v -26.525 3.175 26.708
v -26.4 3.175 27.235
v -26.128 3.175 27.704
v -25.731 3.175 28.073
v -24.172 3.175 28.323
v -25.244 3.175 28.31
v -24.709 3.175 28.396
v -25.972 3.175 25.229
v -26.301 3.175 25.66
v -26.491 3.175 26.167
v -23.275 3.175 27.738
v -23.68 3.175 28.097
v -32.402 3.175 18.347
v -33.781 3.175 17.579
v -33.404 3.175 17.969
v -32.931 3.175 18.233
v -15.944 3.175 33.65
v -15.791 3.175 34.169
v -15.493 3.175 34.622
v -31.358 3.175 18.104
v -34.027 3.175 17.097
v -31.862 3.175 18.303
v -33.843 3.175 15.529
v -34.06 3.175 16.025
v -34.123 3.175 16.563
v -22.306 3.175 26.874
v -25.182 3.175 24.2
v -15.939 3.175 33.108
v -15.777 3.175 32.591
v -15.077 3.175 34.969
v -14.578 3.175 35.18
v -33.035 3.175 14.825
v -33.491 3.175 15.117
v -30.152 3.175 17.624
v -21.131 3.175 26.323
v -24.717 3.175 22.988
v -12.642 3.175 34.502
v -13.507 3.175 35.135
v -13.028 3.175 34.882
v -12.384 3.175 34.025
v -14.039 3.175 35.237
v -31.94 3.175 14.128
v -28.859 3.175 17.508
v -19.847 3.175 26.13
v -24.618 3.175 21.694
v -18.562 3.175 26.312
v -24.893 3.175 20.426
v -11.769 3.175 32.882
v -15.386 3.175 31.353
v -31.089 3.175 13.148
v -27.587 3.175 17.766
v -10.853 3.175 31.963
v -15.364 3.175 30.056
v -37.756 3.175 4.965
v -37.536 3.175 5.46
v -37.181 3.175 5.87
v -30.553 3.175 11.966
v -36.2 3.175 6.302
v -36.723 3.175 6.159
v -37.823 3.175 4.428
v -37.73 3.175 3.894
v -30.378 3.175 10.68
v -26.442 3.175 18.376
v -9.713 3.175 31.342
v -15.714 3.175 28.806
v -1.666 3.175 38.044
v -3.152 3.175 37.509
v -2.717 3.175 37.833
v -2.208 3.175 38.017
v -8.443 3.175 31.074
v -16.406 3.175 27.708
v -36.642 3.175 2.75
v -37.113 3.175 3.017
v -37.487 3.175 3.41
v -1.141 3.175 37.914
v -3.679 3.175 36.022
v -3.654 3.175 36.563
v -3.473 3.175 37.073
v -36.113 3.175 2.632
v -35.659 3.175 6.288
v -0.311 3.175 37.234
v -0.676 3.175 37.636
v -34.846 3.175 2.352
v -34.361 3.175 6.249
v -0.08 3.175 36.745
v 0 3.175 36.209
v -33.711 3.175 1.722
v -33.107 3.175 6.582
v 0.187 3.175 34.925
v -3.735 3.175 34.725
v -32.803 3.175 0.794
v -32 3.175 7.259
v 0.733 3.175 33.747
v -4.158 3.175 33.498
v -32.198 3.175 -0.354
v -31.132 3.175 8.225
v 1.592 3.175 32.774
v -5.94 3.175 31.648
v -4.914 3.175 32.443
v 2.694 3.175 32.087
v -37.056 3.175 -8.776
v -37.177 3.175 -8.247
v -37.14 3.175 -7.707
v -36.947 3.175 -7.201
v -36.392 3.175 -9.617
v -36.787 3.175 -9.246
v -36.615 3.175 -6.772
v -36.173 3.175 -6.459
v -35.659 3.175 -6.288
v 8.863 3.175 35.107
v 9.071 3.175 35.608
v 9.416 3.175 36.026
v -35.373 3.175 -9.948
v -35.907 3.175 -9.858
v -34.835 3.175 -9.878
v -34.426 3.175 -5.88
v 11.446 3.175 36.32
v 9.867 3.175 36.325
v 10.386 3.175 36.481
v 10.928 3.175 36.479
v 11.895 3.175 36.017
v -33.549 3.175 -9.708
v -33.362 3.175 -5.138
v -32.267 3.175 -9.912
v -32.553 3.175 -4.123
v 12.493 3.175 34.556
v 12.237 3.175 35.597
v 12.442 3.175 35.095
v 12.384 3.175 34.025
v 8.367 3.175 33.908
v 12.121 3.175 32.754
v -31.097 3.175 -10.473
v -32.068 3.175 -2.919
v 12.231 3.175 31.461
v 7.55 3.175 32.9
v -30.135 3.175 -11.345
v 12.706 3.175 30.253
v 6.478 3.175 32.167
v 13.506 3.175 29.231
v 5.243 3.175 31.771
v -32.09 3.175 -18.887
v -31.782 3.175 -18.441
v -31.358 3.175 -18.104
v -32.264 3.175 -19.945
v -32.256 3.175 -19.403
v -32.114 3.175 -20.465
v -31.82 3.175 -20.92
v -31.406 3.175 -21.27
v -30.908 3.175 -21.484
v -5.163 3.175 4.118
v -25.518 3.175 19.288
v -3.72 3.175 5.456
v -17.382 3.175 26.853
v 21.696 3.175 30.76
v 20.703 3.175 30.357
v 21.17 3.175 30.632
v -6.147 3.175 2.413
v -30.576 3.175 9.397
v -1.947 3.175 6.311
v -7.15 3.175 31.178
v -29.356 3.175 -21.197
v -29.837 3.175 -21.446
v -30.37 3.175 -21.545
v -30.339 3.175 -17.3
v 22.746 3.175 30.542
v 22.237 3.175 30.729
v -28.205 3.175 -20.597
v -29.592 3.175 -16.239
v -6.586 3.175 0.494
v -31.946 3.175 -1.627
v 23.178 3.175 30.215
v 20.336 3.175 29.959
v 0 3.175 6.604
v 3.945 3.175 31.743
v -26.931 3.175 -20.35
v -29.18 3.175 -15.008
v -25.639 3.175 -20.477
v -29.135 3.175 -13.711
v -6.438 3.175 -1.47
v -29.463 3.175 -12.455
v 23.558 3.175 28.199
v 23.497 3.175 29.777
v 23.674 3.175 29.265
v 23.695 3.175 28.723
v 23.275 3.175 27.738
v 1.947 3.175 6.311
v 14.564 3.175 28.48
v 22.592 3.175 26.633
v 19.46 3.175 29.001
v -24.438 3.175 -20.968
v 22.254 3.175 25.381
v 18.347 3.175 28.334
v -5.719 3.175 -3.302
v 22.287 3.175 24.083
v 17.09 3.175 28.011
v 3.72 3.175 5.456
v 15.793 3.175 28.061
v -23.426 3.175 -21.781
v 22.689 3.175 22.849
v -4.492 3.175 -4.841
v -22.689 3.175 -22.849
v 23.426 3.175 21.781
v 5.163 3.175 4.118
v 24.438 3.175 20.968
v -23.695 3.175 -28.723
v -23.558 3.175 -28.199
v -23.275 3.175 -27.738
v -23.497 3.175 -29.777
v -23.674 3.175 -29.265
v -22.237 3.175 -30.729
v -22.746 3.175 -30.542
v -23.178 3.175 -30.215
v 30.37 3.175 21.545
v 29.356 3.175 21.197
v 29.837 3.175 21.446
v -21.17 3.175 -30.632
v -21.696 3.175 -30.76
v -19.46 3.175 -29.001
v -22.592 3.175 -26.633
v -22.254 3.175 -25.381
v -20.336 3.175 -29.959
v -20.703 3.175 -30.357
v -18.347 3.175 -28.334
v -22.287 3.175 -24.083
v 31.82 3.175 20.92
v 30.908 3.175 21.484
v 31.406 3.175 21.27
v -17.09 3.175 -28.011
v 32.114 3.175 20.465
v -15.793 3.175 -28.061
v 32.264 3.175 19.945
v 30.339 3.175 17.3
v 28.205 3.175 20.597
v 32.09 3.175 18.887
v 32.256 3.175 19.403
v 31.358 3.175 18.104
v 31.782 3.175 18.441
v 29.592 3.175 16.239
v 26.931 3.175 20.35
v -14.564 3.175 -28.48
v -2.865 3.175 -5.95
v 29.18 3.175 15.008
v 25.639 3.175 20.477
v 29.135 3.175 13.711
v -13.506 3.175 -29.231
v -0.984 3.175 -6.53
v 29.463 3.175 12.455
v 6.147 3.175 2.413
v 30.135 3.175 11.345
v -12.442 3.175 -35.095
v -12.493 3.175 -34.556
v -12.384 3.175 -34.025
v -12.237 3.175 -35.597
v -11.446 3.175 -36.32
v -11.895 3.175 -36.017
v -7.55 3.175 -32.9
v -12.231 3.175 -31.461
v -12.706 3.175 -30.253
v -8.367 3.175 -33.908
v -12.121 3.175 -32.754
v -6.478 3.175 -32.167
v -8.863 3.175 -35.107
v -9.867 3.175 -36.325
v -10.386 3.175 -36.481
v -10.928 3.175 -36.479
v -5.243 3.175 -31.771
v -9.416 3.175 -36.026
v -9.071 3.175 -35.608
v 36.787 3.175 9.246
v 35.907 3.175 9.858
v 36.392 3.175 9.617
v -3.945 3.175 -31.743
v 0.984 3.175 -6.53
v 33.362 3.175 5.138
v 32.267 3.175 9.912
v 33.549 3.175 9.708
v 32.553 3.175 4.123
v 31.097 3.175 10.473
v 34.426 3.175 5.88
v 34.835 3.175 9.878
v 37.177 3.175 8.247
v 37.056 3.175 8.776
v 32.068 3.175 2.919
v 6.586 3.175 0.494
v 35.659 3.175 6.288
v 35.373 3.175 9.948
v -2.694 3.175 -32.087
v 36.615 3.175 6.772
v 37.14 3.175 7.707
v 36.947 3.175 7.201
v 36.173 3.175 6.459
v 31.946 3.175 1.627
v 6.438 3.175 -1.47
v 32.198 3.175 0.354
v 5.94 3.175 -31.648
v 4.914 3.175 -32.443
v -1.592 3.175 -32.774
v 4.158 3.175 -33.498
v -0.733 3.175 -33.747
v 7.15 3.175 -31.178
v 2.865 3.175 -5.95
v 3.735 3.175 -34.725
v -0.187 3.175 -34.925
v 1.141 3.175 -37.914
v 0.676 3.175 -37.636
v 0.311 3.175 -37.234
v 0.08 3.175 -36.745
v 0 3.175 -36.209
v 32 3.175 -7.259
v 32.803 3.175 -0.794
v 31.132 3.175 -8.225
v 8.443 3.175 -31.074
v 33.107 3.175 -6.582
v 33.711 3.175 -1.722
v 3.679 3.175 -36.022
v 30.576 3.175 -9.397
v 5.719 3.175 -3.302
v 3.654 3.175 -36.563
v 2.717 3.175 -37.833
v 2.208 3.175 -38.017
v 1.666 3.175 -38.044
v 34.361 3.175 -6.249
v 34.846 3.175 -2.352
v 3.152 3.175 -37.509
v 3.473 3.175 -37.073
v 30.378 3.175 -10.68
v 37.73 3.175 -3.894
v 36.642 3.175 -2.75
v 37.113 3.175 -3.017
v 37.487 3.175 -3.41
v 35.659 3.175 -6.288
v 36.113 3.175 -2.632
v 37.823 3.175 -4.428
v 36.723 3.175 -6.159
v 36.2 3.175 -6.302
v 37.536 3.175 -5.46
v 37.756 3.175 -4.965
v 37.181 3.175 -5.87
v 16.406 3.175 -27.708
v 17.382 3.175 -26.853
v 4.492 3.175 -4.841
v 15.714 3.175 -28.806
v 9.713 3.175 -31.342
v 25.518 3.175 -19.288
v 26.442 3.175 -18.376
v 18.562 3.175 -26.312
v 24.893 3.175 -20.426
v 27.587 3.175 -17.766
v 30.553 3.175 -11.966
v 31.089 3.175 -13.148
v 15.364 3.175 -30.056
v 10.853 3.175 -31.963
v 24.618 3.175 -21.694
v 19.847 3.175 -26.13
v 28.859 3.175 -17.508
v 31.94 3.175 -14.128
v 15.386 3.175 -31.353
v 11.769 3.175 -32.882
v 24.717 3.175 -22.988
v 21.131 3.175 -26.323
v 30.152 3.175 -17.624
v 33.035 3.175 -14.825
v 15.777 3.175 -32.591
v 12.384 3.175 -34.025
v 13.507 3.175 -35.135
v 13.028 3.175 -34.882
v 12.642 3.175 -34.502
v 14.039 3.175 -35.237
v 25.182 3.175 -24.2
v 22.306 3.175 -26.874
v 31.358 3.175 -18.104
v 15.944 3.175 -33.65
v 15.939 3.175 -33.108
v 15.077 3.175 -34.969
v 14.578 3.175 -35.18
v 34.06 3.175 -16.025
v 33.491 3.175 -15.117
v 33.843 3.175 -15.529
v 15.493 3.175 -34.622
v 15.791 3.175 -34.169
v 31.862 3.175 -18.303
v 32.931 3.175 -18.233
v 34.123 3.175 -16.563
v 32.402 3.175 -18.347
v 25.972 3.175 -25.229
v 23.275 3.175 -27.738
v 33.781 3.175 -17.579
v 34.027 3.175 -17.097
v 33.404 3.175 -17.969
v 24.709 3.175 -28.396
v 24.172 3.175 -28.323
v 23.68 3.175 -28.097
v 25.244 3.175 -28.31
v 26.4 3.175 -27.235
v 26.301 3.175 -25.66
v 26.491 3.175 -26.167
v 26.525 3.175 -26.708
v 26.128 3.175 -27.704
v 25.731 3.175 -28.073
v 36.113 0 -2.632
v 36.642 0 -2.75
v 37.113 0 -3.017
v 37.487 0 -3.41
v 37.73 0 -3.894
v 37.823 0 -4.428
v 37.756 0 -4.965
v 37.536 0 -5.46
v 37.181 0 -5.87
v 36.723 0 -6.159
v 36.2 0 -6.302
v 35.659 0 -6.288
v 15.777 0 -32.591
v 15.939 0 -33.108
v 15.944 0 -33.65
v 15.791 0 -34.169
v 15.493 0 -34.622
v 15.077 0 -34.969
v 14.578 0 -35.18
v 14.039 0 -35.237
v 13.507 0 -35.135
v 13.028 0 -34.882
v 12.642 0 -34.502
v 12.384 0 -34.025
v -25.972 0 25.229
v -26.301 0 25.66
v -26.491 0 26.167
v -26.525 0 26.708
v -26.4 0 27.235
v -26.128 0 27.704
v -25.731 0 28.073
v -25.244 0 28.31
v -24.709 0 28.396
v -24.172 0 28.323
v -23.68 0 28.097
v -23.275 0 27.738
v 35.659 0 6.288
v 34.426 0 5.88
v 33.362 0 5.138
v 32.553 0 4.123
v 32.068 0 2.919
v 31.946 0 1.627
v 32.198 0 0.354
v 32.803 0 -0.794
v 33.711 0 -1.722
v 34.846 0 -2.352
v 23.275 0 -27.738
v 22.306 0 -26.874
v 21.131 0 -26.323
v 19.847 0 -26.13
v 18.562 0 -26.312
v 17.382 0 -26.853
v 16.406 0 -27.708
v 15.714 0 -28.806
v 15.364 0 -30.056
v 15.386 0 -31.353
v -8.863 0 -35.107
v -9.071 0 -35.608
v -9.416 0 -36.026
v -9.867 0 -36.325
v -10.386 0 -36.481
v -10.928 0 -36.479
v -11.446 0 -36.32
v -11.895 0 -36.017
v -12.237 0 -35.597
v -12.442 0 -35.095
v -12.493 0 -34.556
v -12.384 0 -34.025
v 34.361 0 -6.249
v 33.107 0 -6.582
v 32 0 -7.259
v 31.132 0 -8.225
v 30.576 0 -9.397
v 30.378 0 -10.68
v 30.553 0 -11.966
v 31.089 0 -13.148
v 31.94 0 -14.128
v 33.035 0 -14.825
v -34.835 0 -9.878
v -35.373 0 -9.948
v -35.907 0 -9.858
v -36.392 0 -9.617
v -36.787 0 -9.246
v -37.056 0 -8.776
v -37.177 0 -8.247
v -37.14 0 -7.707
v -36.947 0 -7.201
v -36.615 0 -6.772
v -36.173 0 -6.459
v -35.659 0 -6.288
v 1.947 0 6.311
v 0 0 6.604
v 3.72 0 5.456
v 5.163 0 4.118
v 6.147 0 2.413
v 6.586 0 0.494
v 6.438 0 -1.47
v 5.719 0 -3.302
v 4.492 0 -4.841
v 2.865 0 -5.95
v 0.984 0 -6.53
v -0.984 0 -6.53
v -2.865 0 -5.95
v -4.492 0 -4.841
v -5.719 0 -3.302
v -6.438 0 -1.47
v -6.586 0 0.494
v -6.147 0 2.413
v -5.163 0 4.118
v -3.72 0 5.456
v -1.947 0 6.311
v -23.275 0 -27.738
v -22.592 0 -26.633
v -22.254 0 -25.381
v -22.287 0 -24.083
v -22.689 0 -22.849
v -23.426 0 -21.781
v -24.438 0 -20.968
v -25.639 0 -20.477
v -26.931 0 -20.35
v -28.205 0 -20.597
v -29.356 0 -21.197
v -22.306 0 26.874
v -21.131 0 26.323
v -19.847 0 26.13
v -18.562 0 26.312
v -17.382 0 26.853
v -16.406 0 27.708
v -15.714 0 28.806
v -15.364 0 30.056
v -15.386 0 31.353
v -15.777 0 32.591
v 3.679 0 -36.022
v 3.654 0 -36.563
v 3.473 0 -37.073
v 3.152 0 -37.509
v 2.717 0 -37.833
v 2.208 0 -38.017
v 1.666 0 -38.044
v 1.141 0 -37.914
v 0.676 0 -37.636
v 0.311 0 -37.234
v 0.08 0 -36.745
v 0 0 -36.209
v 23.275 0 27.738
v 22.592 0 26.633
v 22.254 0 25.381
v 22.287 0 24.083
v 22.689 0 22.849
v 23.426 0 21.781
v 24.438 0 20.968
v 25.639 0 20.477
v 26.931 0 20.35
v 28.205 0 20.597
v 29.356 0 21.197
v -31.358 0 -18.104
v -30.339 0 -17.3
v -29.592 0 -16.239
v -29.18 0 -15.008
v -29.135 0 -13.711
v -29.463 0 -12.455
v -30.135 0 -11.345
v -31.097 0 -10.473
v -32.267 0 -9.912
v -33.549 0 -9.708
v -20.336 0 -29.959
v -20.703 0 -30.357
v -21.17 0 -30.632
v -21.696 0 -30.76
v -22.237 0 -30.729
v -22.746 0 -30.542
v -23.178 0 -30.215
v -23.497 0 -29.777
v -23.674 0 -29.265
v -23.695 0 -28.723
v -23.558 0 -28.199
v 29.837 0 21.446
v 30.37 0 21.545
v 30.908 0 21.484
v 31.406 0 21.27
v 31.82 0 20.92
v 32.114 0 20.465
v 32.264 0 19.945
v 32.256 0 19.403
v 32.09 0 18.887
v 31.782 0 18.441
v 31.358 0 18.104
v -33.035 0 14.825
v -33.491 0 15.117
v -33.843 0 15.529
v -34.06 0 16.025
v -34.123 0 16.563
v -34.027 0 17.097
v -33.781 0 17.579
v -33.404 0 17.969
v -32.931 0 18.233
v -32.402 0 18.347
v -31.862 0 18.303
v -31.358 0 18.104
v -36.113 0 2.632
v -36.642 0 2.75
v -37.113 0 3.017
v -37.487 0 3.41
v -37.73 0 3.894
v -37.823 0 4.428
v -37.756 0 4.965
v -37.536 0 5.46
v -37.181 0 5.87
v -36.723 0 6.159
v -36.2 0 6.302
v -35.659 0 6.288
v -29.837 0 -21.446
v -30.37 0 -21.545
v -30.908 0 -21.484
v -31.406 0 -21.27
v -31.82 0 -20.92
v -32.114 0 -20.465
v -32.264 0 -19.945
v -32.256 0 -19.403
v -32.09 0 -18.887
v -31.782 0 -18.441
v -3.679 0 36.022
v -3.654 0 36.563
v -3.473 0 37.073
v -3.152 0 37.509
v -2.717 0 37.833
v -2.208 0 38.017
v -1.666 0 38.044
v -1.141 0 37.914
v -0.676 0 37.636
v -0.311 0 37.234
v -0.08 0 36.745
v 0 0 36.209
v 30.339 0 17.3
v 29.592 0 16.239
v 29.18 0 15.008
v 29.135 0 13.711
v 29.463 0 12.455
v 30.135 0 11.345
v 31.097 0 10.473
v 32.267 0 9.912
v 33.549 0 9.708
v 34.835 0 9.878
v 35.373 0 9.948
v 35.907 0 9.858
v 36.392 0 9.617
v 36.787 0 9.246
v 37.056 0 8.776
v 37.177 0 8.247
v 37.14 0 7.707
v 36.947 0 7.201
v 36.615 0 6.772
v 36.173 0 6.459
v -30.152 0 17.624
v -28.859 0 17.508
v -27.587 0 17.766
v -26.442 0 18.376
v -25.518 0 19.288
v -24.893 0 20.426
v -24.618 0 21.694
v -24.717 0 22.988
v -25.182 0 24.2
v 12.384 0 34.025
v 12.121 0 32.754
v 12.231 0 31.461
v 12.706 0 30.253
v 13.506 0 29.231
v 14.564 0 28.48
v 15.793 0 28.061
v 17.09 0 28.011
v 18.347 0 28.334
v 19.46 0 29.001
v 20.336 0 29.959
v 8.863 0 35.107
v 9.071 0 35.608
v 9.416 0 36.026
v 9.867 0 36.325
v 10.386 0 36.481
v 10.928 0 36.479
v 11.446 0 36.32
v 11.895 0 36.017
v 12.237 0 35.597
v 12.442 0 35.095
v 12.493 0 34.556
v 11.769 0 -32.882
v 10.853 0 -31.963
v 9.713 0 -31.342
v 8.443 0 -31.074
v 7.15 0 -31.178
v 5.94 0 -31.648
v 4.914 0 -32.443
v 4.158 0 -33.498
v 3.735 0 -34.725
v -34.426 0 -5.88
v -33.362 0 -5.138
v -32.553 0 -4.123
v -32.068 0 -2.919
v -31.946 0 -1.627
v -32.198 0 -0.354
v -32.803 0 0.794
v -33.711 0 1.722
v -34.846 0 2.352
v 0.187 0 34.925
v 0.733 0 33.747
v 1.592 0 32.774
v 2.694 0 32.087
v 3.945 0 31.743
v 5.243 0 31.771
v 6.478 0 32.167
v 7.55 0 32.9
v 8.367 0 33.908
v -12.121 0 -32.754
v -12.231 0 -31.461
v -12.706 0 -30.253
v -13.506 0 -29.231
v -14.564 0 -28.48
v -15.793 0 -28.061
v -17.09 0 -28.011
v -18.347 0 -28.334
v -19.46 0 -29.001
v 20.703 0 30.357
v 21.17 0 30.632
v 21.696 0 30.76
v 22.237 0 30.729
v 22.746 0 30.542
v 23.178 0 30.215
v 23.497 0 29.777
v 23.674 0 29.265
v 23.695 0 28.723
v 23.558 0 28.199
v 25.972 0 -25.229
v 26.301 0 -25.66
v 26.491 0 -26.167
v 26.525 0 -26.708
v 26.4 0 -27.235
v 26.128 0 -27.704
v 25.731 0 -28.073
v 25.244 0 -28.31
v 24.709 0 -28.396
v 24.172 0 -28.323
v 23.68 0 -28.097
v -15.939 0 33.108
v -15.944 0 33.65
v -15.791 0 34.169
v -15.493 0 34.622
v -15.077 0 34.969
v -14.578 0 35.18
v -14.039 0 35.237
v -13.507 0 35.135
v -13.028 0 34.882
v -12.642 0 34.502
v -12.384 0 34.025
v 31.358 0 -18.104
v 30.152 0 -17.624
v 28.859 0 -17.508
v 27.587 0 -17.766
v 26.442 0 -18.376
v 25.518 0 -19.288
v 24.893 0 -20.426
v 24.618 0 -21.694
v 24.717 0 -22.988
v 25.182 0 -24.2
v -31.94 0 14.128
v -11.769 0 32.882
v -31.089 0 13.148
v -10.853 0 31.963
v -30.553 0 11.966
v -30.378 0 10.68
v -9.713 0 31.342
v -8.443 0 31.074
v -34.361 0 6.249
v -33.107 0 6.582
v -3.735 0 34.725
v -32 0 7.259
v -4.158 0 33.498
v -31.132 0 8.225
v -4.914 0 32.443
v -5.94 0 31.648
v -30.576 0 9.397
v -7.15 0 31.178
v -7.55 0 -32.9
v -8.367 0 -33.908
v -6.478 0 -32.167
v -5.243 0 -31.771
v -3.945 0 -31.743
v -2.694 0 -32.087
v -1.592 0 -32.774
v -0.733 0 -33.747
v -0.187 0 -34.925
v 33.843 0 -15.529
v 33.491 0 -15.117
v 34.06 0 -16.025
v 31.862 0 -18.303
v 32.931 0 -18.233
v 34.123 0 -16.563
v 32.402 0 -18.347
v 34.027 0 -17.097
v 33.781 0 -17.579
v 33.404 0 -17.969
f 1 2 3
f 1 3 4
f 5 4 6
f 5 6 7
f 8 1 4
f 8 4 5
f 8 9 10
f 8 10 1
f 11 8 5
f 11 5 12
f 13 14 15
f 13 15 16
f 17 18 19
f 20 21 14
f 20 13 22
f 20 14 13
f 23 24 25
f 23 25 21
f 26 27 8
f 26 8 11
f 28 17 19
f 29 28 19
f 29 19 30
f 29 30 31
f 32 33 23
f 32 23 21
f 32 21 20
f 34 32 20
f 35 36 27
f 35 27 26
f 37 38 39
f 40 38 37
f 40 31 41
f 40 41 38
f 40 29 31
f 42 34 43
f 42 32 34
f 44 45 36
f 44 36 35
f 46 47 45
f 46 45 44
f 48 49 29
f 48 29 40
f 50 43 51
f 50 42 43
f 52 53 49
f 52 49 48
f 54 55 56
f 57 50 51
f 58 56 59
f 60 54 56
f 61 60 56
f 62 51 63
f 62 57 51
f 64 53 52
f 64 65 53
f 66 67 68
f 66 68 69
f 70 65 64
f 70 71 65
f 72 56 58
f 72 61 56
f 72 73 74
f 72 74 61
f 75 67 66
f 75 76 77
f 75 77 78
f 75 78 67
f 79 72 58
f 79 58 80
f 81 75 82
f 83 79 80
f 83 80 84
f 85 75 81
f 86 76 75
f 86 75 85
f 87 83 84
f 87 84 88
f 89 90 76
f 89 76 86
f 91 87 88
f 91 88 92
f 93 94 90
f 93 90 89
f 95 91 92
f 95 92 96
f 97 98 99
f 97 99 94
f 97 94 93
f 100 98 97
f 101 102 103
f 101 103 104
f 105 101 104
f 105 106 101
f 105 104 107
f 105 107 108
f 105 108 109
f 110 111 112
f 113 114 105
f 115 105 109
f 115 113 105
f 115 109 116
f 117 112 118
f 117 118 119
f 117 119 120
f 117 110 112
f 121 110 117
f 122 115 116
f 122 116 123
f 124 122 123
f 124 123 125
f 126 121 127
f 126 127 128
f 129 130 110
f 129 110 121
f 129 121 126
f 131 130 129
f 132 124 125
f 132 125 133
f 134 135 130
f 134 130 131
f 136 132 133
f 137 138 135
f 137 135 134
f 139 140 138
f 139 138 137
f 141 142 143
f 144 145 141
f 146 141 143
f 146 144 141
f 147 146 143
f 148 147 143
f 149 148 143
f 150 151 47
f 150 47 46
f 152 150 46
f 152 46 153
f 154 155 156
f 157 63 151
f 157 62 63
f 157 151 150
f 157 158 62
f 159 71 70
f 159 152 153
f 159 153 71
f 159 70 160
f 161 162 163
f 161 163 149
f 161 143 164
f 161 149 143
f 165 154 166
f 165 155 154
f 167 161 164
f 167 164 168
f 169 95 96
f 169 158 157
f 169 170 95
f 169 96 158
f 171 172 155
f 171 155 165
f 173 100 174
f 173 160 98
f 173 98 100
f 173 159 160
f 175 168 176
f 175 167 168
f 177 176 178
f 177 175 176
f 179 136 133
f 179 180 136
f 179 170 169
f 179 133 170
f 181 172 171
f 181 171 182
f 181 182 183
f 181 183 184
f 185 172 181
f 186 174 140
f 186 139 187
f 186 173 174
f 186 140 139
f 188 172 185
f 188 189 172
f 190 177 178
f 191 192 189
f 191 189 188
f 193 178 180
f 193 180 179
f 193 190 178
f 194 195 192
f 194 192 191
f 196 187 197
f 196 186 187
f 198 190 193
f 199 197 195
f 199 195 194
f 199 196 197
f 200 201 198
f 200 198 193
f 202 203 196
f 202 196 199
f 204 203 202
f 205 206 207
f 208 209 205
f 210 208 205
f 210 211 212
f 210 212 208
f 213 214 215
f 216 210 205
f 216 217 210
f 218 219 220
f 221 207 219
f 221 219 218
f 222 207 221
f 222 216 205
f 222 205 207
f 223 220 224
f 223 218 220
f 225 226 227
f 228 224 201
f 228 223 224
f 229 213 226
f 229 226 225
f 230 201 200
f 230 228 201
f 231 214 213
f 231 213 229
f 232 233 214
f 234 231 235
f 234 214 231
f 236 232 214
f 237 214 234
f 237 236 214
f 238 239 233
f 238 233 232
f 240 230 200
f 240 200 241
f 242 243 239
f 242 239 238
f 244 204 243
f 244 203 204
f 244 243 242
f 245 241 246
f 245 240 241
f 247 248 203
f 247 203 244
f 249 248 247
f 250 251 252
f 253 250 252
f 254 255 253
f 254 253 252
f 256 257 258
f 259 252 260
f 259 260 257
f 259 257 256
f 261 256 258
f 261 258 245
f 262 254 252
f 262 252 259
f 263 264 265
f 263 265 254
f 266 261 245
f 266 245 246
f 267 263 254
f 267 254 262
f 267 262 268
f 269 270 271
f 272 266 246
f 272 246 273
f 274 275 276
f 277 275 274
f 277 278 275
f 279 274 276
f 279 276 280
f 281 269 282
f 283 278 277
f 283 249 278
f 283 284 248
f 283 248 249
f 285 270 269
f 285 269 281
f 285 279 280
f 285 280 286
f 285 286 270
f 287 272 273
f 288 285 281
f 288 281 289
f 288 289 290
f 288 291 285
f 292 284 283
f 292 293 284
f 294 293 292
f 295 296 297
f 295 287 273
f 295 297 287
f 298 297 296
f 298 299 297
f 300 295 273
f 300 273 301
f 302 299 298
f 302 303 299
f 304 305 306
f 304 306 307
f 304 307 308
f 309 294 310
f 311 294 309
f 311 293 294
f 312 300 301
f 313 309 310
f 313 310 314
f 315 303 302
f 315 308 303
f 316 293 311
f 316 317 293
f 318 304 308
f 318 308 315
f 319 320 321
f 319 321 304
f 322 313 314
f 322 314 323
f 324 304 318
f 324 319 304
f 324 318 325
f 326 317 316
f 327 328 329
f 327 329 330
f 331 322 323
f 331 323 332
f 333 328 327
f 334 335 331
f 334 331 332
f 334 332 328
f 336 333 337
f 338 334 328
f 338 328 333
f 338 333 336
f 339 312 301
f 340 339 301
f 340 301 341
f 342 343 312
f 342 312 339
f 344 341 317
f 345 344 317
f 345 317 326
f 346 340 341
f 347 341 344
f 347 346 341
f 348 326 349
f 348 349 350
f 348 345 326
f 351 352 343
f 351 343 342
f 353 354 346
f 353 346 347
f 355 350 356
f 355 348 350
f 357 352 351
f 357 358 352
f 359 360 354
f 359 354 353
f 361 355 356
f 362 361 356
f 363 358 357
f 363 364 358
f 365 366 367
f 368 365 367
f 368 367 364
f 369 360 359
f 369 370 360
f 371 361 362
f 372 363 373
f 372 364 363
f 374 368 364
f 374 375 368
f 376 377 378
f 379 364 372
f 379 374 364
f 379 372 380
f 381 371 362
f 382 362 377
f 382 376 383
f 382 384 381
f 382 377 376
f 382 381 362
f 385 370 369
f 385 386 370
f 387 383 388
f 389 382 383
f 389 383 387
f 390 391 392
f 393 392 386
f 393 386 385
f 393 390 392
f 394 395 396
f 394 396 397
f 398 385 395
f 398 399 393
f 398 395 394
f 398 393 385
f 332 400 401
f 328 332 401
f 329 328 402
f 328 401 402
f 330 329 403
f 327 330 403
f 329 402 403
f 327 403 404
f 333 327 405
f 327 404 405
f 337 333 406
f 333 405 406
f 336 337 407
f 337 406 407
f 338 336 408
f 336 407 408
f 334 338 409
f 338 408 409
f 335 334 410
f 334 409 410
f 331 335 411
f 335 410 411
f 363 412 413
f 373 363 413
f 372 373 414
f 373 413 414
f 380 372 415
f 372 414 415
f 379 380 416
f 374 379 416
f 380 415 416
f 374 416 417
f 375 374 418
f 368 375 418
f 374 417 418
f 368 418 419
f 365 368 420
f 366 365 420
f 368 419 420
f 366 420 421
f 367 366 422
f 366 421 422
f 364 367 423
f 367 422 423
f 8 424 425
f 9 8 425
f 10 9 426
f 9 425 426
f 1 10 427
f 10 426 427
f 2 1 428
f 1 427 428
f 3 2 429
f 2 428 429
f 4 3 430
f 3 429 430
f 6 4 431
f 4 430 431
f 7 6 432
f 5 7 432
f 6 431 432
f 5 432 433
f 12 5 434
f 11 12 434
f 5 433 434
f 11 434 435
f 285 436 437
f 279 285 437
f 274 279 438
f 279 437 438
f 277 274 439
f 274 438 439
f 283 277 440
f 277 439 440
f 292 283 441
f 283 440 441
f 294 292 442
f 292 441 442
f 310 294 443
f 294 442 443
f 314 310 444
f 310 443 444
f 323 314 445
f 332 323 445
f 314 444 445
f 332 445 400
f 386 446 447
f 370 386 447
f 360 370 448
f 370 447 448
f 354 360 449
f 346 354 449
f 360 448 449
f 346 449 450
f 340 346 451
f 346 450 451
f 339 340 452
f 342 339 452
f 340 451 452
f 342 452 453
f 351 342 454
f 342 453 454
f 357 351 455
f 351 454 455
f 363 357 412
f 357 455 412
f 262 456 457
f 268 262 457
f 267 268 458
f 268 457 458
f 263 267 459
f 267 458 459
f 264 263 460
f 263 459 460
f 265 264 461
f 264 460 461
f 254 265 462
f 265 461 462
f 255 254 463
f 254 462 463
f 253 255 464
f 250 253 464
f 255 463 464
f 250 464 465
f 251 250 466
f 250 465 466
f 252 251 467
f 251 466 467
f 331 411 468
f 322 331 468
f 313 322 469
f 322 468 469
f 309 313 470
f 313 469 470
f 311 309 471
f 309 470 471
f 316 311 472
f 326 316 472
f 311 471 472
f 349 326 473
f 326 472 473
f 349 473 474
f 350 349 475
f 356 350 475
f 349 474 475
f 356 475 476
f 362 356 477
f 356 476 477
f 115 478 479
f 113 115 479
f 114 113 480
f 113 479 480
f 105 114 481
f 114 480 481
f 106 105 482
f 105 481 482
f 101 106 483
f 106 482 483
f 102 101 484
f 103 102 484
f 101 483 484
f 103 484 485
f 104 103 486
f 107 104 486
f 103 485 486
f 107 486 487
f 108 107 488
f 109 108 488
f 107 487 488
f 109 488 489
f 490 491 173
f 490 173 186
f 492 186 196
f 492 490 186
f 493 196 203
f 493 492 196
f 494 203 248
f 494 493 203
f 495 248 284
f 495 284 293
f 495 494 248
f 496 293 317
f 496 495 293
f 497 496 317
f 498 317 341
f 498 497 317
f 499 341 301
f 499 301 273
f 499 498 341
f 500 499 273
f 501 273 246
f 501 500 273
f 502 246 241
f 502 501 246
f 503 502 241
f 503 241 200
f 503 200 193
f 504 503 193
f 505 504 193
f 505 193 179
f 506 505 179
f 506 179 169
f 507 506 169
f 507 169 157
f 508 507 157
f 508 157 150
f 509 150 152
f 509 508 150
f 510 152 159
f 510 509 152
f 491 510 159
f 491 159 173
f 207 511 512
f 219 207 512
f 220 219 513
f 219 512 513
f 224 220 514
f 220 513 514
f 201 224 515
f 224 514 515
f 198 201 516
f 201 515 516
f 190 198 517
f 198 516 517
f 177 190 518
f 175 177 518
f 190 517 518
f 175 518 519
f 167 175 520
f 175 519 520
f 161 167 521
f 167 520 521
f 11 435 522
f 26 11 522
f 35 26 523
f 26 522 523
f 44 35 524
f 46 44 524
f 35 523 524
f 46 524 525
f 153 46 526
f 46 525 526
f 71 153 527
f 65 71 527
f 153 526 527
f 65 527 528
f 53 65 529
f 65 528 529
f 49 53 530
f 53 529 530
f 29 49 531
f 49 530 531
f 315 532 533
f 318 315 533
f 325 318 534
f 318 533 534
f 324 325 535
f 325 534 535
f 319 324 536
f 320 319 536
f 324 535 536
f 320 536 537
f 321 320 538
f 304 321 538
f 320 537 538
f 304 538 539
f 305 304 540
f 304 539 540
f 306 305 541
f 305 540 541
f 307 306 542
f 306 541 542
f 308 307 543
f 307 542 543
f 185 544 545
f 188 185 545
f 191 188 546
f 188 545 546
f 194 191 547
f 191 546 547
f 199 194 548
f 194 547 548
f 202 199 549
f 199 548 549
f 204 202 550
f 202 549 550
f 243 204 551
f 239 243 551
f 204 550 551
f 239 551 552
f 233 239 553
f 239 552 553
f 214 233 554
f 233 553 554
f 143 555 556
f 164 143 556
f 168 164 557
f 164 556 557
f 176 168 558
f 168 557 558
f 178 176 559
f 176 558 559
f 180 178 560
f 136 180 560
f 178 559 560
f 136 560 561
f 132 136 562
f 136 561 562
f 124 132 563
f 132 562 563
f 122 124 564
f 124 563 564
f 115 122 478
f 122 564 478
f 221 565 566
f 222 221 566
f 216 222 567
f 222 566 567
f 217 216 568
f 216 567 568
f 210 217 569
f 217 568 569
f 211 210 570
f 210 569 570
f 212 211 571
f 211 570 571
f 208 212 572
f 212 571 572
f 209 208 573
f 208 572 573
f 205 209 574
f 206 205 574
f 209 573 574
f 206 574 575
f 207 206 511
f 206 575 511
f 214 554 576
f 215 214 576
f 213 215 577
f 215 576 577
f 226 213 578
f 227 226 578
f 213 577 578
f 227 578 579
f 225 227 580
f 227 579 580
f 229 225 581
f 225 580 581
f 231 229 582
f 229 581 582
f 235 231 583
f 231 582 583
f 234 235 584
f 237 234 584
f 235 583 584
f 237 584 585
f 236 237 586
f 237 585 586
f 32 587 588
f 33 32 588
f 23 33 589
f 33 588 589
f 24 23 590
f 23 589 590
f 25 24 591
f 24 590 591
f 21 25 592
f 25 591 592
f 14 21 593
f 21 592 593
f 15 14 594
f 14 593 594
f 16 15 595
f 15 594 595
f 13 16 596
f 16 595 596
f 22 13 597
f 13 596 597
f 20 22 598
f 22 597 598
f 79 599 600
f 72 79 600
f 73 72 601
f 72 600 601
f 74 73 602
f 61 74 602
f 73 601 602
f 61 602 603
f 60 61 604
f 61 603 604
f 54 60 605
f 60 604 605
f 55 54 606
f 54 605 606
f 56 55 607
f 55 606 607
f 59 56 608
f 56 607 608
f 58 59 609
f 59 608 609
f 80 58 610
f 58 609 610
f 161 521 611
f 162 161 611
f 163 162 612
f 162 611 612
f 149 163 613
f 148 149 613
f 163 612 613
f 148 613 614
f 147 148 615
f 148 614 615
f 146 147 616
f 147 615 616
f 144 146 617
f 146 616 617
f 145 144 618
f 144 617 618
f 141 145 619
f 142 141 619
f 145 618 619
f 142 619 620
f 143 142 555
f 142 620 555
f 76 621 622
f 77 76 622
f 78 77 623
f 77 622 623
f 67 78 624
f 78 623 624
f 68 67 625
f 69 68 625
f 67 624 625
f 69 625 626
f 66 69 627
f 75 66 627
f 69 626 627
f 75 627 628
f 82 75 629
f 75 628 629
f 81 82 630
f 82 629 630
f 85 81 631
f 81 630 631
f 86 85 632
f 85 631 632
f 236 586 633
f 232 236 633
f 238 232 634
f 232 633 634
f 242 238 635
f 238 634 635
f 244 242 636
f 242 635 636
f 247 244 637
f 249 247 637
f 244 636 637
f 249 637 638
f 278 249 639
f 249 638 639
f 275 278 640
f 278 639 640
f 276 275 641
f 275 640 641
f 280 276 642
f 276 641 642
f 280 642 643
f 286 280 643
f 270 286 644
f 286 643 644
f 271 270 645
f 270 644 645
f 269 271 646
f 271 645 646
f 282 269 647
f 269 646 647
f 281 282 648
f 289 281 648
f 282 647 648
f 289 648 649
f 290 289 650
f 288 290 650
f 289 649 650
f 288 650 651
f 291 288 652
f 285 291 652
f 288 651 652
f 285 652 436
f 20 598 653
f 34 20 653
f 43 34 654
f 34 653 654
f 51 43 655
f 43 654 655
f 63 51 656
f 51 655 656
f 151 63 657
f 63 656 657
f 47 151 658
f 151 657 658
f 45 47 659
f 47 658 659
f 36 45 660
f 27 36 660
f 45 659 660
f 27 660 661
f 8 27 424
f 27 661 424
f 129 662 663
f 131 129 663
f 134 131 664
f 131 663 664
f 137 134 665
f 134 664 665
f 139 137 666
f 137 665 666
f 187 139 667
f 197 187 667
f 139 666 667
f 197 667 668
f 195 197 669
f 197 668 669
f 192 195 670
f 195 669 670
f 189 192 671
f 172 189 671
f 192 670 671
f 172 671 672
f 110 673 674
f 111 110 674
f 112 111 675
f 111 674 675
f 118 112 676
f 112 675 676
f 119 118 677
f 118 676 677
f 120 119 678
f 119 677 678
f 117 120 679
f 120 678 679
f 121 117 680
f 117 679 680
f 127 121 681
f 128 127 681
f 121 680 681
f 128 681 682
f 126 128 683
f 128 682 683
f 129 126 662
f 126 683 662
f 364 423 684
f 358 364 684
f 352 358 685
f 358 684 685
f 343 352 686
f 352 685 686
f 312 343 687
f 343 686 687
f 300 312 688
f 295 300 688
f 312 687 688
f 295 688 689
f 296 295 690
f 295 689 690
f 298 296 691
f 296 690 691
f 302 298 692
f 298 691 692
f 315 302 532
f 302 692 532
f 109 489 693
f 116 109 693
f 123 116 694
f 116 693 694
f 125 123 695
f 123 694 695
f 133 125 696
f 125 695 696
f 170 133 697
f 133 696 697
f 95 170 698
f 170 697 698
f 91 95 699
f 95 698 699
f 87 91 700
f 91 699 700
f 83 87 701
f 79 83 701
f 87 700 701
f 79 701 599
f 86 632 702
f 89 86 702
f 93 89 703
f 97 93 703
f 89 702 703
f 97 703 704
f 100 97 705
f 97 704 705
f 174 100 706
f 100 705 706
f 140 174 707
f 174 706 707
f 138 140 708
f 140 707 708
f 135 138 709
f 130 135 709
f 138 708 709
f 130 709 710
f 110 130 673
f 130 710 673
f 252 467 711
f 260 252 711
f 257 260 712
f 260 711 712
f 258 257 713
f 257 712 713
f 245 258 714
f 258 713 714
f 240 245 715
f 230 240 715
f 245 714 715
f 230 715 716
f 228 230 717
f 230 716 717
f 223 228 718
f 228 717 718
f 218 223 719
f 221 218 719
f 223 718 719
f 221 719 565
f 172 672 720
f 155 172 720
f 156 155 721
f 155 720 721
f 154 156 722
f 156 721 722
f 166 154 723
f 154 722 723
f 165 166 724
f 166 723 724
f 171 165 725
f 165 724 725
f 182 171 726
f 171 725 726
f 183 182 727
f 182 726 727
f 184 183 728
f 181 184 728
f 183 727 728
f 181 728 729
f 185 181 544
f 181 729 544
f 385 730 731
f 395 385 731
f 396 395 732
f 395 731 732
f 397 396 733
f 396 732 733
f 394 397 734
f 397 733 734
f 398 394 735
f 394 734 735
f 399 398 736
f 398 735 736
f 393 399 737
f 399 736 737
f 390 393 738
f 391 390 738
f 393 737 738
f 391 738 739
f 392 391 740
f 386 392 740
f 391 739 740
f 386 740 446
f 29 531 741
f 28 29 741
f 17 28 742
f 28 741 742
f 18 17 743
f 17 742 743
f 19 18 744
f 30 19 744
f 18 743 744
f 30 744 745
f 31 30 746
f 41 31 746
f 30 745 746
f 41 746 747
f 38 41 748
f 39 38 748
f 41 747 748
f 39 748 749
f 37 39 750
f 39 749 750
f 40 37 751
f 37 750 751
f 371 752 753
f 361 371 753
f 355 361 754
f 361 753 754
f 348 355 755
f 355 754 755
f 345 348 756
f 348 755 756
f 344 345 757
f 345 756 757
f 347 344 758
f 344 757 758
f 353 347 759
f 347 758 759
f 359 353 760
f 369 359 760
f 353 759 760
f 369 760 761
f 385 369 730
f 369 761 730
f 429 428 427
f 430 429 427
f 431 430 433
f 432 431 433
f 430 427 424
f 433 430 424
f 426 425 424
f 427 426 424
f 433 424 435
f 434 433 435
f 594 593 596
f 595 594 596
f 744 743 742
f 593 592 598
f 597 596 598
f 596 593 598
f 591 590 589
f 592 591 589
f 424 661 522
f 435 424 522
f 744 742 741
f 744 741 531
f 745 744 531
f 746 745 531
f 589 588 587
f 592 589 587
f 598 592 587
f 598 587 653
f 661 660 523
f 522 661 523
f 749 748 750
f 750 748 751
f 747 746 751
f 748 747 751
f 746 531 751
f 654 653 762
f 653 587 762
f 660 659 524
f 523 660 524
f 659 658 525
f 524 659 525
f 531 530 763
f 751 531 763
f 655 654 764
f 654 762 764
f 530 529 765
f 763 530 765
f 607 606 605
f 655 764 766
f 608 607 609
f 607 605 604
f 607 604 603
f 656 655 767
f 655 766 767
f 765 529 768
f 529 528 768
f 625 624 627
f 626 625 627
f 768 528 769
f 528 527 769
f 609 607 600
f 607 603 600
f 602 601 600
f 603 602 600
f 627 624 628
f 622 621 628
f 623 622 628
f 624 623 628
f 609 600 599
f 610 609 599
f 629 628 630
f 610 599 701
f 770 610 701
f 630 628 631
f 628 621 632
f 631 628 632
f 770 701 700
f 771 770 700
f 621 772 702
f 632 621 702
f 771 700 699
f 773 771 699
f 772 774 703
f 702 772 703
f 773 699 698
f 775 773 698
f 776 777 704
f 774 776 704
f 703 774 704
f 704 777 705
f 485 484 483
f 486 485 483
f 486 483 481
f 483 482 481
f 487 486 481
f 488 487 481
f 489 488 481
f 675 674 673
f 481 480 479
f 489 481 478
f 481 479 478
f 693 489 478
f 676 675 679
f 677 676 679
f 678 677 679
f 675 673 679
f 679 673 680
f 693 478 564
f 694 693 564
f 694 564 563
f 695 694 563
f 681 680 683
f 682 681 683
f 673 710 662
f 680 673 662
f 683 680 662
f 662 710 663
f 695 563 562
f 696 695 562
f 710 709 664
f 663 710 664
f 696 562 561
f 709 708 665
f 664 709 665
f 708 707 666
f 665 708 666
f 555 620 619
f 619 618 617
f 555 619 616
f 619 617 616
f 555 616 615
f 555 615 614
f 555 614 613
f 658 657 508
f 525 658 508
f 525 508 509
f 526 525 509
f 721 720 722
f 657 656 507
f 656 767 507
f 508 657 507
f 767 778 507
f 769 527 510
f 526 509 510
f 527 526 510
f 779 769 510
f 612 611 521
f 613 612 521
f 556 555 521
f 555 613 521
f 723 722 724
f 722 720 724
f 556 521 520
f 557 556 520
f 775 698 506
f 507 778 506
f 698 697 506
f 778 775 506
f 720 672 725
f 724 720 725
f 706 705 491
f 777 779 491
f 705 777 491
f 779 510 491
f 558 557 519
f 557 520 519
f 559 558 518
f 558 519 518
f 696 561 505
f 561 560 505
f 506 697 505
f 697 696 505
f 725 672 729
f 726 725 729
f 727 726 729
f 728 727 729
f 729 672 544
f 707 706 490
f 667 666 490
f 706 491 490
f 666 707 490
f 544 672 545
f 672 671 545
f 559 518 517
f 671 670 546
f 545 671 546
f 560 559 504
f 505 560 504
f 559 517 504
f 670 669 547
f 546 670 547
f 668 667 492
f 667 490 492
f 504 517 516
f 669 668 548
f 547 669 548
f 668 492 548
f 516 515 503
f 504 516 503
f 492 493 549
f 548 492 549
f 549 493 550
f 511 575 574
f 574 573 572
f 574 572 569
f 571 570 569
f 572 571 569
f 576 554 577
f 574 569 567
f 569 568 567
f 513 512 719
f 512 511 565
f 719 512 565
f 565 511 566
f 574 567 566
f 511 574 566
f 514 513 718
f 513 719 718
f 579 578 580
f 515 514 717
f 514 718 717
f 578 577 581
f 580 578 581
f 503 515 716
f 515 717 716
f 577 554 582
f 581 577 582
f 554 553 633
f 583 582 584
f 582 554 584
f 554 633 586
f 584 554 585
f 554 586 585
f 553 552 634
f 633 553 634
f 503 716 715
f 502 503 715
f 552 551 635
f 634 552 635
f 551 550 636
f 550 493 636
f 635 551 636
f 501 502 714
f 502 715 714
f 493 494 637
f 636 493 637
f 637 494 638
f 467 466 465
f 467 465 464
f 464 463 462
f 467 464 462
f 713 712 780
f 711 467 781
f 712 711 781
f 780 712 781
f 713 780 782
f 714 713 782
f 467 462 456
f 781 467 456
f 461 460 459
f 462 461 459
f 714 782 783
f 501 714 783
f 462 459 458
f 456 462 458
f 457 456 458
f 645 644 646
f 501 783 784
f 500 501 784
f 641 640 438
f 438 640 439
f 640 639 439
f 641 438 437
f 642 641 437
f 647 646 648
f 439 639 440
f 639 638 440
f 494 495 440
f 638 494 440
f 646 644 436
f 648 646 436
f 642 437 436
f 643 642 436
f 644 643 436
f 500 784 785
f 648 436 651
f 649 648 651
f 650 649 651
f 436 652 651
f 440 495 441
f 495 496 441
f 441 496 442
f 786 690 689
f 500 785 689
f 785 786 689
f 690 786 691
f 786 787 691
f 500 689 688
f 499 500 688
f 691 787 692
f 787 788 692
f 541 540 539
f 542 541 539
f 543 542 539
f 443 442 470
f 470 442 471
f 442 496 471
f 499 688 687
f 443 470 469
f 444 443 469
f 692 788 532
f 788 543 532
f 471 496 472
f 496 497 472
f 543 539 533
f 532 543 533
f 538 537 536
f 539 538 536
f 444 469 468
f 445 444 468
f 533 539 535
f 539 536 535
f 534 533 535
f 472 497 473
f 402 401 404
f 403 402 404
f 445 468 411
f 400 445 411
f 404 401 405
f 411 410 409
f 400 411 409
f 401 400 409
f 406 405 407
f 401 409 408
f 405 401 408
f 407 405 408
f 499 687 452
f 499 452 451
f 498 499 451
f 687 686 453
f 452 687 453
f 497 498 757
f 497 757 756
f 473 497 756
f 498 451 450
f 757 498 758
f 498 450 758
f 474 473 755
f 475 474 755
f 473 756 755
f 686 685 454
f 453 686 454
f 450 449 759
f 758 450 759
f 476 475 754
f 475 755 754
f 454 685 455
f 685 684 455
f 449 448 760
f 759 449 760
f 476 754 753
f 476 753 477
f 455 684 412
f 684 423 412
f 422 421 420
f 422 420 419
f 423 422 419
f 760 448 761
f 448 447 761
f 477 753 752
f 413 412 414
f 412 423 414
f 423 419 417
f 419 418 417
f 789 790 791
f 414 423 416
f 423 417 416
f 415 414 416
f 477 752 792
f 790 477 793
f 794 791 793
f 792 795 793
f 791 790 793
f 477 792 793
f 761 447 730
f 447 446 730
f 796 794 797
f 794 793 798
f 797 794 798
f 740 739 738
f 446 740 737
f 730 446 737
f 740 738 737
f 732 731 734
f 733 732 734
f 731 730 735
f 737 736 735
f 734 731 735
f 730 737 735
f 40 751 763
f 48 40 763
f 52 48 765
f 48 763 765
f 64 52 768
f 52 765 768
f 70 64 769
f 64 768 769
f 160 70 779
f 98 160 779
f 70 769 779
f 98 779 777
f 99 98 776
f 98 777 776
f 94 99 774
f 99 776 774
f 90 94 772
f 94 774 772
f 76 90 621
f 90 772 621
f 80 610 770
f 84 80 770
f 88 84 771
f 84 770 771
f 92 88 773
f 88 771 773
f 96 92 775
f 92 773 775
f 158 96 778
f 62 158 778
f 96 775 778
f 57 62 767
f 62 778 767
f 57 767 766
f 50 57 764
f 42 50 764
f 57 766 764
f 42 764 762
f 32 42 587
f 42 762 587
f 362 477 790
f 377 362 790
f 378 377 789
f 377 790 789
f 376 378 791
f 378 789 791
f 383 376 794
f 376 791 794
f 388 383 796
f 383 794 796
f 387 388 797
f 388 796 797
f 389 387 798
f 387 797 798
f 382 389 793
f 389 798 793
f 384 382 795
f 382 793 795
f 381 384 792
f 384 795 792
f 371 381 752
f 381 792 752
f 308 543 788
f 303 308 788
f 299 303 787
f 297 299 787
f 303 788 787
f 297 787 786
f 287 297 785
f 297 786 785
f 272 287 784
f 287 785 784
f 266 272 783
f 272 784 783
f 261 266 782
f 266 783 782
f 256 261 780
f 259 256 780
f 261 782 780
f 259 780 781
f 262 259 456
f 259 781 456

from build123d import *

# Parameters (mm, degrees)
SKETCH1_R           = 6.604
BOSS_EXTRUDE1_DEPTH = 3.175


with BuildPart() as part:
    # Sketch1 → Boss-Extrude1 (new body)
    with BuildSketch(Plane(origin=(0, 0, 0), x_dir=(1, 0, 0), z_dir=(0, 1, 0))):
        with BuildLine():
            ThreePointArc((0, -36.208877371), (3.945014404, -31.74323173), (8.863107106, -35.107380035))
            ThreePointArc((8.863107106, -35.107380035), (11.19297859, -36.418775793), (12.384165428, -34.025214873))
            ThreePointArc((12.384165428, -34.025214873), (14.563925591, -28.479606225), (20.336027496, -29.958784791))
            ThreePointArc((20.336027496, -29.958784791), (22.973914302, -30.39423073), (23.274617735, -27.737609302))
            ThreePointArc((23.274617735, -27.737609302), (23.42621241, -21.780919895), (29.356122842, -21.196717957))
            ThreePointArc((29.356122842, -21.196717957), (31.98385689, -20.703692869), (31.357807646, -18.104438686))
            ThreePointArc((31.357807646, -18.104438686), (29.462952279, -12.455133173), (34.835436523, -9.878014107))
            ThreePointArc((34.835436523, -9.878014107), (37.136074307, -8.515984094), (35.658783163, -6.287605571))
            ThreePointArc((35.658783163, -6.287605571), (31.946025276, -1.627073572), (36.113082444, 2.632124028))
            ThreePointArc((36.113082444, 2.632124028), (37.809133091, 4.698878045), (35.658783163, 6.287605571))
            ThreePointArc((35.658783163, 6.287605571), (30.575936152, 9.397235114), (33.034957649, 14.824789159))
            ThreePointArc((33.034957649, 14.824789159), (33.921852422, 17.346986144), (31.357807646, 18.104438686))
            ThreePointArc((31.357807646, 18.104438686), (25.517937875, 19.288098557), (25.972329417, 25.229365928))
            ThreePointArc((25.972329417, 25.229365928), (25.943095717, 27.902791699), (23.274617735, 27.737609302))
            ThreePointArc((23.274617735, 27.737609302), (17.382099685, 26.852532653), (15.777054948, 32.590908819))
            ThreePointArc((15.777054948, 32.590908819), (14.835218789, 35.093108775), (12.384165428, 34.025214873))
            ThreePointArc((12.384165428, 34.025214873), (7.149723742, 31.178155009), (3.678834807, 36.021507116))
            ThreePointArc((3.678834807, 36.021507116), (1.937995531, 38.050679013), (0, 36.208877371))
            ThreePointArc((0, 36.208877371), (-3.945014404, 31.74323173), (-8.863107106, 35.107380035))
            ThreePointArc((-8.863107106, 35.107380035), (-11.19297859, 36.418775793), (-12.384165428, 34.025214873))
            ThreePointArc((-12.384165428, 34.025214873), (-14.563925591, 28.479606225), (-20.336027496, 29.958784791))
            ThreePointArc((-20.336027496, 29.958784791), (-22.973914302, 30.39423073), (-23.274617735, 27.737609302))
            ThreePointArc((-23.274617735, 27.737609302), (-23.42621241, 21.780919895), (-29.356122842, 21.196717957))
            ThreePointArc((-29.356122842, 21.196717957), (-31.98385689, 20.703692869), (-31.357807646, 18.104438686))
            ThreePointArc((-31.357807646, 18.104438686), (-29.462952279, 12.455133173), (-34.835436523, 9.878014107))
            ThreePointArc((-34.835436523, 9.878014107), (-37.136074307, 8.515984094), (-35.658783163, 6.287605571))
            ThreePointArc((-35.658783163, 6.287605571), (-31.946025276, 1.627073572), (-36.113082444, -2.632124028))
            ThreePointArc((-36.113082444, -2.632124028), (-37.809133091, -4.698878045), (-35.658783163, -6.287605571))
            ThreePointArc((-35.658783163, -6.287605571), (-30.575936152, -9.397235114), (-33.034957649, -14.824789159))
            ThreePointArc((-33.034957649, -14.824789159), (-33.921852422, -17.346986144), (-31.357807646, -18.104438686))
            ThreePointArc((-31.357807646, -18.104438686), (-25.517937875, -19.288098557), (-25.972329417, -25.229365928))
            ThreePointArc((-25.972329417, -25.229365928), (-25.943095717, -27.902791699), (-23.274617735, -27.737609302))
            ThreePointArc((-23.274617735, -27.737609302), (-17.382099685, -26.852532653), (-15.777054948, -32.590908819))
            ThreePointArc((-15.777054948, -32.590908819), (-14.835218789, -35.093108775), (-12.384165428, -34.025214873))
            ThreePointArc((-12.384165428, -34.025214873), (-7.149723742, -31.178155009), (-3.678834807, -36.021507116))
            ThreePointArc((-3.678834807, -36.021507116), (-1.937995531, -38.050679013), (0, -36.208877371))
        make_face()
        with Locations(Location((0, 0, 0), (0, 0, 270))):  # turned: the seam where the file's is
            Circle(SKETCH1_R, mode=Mode.SUBTRACT)
    extrude(amount=BOSS_EXTRUDE1_DEPTH)


solid = part.part
